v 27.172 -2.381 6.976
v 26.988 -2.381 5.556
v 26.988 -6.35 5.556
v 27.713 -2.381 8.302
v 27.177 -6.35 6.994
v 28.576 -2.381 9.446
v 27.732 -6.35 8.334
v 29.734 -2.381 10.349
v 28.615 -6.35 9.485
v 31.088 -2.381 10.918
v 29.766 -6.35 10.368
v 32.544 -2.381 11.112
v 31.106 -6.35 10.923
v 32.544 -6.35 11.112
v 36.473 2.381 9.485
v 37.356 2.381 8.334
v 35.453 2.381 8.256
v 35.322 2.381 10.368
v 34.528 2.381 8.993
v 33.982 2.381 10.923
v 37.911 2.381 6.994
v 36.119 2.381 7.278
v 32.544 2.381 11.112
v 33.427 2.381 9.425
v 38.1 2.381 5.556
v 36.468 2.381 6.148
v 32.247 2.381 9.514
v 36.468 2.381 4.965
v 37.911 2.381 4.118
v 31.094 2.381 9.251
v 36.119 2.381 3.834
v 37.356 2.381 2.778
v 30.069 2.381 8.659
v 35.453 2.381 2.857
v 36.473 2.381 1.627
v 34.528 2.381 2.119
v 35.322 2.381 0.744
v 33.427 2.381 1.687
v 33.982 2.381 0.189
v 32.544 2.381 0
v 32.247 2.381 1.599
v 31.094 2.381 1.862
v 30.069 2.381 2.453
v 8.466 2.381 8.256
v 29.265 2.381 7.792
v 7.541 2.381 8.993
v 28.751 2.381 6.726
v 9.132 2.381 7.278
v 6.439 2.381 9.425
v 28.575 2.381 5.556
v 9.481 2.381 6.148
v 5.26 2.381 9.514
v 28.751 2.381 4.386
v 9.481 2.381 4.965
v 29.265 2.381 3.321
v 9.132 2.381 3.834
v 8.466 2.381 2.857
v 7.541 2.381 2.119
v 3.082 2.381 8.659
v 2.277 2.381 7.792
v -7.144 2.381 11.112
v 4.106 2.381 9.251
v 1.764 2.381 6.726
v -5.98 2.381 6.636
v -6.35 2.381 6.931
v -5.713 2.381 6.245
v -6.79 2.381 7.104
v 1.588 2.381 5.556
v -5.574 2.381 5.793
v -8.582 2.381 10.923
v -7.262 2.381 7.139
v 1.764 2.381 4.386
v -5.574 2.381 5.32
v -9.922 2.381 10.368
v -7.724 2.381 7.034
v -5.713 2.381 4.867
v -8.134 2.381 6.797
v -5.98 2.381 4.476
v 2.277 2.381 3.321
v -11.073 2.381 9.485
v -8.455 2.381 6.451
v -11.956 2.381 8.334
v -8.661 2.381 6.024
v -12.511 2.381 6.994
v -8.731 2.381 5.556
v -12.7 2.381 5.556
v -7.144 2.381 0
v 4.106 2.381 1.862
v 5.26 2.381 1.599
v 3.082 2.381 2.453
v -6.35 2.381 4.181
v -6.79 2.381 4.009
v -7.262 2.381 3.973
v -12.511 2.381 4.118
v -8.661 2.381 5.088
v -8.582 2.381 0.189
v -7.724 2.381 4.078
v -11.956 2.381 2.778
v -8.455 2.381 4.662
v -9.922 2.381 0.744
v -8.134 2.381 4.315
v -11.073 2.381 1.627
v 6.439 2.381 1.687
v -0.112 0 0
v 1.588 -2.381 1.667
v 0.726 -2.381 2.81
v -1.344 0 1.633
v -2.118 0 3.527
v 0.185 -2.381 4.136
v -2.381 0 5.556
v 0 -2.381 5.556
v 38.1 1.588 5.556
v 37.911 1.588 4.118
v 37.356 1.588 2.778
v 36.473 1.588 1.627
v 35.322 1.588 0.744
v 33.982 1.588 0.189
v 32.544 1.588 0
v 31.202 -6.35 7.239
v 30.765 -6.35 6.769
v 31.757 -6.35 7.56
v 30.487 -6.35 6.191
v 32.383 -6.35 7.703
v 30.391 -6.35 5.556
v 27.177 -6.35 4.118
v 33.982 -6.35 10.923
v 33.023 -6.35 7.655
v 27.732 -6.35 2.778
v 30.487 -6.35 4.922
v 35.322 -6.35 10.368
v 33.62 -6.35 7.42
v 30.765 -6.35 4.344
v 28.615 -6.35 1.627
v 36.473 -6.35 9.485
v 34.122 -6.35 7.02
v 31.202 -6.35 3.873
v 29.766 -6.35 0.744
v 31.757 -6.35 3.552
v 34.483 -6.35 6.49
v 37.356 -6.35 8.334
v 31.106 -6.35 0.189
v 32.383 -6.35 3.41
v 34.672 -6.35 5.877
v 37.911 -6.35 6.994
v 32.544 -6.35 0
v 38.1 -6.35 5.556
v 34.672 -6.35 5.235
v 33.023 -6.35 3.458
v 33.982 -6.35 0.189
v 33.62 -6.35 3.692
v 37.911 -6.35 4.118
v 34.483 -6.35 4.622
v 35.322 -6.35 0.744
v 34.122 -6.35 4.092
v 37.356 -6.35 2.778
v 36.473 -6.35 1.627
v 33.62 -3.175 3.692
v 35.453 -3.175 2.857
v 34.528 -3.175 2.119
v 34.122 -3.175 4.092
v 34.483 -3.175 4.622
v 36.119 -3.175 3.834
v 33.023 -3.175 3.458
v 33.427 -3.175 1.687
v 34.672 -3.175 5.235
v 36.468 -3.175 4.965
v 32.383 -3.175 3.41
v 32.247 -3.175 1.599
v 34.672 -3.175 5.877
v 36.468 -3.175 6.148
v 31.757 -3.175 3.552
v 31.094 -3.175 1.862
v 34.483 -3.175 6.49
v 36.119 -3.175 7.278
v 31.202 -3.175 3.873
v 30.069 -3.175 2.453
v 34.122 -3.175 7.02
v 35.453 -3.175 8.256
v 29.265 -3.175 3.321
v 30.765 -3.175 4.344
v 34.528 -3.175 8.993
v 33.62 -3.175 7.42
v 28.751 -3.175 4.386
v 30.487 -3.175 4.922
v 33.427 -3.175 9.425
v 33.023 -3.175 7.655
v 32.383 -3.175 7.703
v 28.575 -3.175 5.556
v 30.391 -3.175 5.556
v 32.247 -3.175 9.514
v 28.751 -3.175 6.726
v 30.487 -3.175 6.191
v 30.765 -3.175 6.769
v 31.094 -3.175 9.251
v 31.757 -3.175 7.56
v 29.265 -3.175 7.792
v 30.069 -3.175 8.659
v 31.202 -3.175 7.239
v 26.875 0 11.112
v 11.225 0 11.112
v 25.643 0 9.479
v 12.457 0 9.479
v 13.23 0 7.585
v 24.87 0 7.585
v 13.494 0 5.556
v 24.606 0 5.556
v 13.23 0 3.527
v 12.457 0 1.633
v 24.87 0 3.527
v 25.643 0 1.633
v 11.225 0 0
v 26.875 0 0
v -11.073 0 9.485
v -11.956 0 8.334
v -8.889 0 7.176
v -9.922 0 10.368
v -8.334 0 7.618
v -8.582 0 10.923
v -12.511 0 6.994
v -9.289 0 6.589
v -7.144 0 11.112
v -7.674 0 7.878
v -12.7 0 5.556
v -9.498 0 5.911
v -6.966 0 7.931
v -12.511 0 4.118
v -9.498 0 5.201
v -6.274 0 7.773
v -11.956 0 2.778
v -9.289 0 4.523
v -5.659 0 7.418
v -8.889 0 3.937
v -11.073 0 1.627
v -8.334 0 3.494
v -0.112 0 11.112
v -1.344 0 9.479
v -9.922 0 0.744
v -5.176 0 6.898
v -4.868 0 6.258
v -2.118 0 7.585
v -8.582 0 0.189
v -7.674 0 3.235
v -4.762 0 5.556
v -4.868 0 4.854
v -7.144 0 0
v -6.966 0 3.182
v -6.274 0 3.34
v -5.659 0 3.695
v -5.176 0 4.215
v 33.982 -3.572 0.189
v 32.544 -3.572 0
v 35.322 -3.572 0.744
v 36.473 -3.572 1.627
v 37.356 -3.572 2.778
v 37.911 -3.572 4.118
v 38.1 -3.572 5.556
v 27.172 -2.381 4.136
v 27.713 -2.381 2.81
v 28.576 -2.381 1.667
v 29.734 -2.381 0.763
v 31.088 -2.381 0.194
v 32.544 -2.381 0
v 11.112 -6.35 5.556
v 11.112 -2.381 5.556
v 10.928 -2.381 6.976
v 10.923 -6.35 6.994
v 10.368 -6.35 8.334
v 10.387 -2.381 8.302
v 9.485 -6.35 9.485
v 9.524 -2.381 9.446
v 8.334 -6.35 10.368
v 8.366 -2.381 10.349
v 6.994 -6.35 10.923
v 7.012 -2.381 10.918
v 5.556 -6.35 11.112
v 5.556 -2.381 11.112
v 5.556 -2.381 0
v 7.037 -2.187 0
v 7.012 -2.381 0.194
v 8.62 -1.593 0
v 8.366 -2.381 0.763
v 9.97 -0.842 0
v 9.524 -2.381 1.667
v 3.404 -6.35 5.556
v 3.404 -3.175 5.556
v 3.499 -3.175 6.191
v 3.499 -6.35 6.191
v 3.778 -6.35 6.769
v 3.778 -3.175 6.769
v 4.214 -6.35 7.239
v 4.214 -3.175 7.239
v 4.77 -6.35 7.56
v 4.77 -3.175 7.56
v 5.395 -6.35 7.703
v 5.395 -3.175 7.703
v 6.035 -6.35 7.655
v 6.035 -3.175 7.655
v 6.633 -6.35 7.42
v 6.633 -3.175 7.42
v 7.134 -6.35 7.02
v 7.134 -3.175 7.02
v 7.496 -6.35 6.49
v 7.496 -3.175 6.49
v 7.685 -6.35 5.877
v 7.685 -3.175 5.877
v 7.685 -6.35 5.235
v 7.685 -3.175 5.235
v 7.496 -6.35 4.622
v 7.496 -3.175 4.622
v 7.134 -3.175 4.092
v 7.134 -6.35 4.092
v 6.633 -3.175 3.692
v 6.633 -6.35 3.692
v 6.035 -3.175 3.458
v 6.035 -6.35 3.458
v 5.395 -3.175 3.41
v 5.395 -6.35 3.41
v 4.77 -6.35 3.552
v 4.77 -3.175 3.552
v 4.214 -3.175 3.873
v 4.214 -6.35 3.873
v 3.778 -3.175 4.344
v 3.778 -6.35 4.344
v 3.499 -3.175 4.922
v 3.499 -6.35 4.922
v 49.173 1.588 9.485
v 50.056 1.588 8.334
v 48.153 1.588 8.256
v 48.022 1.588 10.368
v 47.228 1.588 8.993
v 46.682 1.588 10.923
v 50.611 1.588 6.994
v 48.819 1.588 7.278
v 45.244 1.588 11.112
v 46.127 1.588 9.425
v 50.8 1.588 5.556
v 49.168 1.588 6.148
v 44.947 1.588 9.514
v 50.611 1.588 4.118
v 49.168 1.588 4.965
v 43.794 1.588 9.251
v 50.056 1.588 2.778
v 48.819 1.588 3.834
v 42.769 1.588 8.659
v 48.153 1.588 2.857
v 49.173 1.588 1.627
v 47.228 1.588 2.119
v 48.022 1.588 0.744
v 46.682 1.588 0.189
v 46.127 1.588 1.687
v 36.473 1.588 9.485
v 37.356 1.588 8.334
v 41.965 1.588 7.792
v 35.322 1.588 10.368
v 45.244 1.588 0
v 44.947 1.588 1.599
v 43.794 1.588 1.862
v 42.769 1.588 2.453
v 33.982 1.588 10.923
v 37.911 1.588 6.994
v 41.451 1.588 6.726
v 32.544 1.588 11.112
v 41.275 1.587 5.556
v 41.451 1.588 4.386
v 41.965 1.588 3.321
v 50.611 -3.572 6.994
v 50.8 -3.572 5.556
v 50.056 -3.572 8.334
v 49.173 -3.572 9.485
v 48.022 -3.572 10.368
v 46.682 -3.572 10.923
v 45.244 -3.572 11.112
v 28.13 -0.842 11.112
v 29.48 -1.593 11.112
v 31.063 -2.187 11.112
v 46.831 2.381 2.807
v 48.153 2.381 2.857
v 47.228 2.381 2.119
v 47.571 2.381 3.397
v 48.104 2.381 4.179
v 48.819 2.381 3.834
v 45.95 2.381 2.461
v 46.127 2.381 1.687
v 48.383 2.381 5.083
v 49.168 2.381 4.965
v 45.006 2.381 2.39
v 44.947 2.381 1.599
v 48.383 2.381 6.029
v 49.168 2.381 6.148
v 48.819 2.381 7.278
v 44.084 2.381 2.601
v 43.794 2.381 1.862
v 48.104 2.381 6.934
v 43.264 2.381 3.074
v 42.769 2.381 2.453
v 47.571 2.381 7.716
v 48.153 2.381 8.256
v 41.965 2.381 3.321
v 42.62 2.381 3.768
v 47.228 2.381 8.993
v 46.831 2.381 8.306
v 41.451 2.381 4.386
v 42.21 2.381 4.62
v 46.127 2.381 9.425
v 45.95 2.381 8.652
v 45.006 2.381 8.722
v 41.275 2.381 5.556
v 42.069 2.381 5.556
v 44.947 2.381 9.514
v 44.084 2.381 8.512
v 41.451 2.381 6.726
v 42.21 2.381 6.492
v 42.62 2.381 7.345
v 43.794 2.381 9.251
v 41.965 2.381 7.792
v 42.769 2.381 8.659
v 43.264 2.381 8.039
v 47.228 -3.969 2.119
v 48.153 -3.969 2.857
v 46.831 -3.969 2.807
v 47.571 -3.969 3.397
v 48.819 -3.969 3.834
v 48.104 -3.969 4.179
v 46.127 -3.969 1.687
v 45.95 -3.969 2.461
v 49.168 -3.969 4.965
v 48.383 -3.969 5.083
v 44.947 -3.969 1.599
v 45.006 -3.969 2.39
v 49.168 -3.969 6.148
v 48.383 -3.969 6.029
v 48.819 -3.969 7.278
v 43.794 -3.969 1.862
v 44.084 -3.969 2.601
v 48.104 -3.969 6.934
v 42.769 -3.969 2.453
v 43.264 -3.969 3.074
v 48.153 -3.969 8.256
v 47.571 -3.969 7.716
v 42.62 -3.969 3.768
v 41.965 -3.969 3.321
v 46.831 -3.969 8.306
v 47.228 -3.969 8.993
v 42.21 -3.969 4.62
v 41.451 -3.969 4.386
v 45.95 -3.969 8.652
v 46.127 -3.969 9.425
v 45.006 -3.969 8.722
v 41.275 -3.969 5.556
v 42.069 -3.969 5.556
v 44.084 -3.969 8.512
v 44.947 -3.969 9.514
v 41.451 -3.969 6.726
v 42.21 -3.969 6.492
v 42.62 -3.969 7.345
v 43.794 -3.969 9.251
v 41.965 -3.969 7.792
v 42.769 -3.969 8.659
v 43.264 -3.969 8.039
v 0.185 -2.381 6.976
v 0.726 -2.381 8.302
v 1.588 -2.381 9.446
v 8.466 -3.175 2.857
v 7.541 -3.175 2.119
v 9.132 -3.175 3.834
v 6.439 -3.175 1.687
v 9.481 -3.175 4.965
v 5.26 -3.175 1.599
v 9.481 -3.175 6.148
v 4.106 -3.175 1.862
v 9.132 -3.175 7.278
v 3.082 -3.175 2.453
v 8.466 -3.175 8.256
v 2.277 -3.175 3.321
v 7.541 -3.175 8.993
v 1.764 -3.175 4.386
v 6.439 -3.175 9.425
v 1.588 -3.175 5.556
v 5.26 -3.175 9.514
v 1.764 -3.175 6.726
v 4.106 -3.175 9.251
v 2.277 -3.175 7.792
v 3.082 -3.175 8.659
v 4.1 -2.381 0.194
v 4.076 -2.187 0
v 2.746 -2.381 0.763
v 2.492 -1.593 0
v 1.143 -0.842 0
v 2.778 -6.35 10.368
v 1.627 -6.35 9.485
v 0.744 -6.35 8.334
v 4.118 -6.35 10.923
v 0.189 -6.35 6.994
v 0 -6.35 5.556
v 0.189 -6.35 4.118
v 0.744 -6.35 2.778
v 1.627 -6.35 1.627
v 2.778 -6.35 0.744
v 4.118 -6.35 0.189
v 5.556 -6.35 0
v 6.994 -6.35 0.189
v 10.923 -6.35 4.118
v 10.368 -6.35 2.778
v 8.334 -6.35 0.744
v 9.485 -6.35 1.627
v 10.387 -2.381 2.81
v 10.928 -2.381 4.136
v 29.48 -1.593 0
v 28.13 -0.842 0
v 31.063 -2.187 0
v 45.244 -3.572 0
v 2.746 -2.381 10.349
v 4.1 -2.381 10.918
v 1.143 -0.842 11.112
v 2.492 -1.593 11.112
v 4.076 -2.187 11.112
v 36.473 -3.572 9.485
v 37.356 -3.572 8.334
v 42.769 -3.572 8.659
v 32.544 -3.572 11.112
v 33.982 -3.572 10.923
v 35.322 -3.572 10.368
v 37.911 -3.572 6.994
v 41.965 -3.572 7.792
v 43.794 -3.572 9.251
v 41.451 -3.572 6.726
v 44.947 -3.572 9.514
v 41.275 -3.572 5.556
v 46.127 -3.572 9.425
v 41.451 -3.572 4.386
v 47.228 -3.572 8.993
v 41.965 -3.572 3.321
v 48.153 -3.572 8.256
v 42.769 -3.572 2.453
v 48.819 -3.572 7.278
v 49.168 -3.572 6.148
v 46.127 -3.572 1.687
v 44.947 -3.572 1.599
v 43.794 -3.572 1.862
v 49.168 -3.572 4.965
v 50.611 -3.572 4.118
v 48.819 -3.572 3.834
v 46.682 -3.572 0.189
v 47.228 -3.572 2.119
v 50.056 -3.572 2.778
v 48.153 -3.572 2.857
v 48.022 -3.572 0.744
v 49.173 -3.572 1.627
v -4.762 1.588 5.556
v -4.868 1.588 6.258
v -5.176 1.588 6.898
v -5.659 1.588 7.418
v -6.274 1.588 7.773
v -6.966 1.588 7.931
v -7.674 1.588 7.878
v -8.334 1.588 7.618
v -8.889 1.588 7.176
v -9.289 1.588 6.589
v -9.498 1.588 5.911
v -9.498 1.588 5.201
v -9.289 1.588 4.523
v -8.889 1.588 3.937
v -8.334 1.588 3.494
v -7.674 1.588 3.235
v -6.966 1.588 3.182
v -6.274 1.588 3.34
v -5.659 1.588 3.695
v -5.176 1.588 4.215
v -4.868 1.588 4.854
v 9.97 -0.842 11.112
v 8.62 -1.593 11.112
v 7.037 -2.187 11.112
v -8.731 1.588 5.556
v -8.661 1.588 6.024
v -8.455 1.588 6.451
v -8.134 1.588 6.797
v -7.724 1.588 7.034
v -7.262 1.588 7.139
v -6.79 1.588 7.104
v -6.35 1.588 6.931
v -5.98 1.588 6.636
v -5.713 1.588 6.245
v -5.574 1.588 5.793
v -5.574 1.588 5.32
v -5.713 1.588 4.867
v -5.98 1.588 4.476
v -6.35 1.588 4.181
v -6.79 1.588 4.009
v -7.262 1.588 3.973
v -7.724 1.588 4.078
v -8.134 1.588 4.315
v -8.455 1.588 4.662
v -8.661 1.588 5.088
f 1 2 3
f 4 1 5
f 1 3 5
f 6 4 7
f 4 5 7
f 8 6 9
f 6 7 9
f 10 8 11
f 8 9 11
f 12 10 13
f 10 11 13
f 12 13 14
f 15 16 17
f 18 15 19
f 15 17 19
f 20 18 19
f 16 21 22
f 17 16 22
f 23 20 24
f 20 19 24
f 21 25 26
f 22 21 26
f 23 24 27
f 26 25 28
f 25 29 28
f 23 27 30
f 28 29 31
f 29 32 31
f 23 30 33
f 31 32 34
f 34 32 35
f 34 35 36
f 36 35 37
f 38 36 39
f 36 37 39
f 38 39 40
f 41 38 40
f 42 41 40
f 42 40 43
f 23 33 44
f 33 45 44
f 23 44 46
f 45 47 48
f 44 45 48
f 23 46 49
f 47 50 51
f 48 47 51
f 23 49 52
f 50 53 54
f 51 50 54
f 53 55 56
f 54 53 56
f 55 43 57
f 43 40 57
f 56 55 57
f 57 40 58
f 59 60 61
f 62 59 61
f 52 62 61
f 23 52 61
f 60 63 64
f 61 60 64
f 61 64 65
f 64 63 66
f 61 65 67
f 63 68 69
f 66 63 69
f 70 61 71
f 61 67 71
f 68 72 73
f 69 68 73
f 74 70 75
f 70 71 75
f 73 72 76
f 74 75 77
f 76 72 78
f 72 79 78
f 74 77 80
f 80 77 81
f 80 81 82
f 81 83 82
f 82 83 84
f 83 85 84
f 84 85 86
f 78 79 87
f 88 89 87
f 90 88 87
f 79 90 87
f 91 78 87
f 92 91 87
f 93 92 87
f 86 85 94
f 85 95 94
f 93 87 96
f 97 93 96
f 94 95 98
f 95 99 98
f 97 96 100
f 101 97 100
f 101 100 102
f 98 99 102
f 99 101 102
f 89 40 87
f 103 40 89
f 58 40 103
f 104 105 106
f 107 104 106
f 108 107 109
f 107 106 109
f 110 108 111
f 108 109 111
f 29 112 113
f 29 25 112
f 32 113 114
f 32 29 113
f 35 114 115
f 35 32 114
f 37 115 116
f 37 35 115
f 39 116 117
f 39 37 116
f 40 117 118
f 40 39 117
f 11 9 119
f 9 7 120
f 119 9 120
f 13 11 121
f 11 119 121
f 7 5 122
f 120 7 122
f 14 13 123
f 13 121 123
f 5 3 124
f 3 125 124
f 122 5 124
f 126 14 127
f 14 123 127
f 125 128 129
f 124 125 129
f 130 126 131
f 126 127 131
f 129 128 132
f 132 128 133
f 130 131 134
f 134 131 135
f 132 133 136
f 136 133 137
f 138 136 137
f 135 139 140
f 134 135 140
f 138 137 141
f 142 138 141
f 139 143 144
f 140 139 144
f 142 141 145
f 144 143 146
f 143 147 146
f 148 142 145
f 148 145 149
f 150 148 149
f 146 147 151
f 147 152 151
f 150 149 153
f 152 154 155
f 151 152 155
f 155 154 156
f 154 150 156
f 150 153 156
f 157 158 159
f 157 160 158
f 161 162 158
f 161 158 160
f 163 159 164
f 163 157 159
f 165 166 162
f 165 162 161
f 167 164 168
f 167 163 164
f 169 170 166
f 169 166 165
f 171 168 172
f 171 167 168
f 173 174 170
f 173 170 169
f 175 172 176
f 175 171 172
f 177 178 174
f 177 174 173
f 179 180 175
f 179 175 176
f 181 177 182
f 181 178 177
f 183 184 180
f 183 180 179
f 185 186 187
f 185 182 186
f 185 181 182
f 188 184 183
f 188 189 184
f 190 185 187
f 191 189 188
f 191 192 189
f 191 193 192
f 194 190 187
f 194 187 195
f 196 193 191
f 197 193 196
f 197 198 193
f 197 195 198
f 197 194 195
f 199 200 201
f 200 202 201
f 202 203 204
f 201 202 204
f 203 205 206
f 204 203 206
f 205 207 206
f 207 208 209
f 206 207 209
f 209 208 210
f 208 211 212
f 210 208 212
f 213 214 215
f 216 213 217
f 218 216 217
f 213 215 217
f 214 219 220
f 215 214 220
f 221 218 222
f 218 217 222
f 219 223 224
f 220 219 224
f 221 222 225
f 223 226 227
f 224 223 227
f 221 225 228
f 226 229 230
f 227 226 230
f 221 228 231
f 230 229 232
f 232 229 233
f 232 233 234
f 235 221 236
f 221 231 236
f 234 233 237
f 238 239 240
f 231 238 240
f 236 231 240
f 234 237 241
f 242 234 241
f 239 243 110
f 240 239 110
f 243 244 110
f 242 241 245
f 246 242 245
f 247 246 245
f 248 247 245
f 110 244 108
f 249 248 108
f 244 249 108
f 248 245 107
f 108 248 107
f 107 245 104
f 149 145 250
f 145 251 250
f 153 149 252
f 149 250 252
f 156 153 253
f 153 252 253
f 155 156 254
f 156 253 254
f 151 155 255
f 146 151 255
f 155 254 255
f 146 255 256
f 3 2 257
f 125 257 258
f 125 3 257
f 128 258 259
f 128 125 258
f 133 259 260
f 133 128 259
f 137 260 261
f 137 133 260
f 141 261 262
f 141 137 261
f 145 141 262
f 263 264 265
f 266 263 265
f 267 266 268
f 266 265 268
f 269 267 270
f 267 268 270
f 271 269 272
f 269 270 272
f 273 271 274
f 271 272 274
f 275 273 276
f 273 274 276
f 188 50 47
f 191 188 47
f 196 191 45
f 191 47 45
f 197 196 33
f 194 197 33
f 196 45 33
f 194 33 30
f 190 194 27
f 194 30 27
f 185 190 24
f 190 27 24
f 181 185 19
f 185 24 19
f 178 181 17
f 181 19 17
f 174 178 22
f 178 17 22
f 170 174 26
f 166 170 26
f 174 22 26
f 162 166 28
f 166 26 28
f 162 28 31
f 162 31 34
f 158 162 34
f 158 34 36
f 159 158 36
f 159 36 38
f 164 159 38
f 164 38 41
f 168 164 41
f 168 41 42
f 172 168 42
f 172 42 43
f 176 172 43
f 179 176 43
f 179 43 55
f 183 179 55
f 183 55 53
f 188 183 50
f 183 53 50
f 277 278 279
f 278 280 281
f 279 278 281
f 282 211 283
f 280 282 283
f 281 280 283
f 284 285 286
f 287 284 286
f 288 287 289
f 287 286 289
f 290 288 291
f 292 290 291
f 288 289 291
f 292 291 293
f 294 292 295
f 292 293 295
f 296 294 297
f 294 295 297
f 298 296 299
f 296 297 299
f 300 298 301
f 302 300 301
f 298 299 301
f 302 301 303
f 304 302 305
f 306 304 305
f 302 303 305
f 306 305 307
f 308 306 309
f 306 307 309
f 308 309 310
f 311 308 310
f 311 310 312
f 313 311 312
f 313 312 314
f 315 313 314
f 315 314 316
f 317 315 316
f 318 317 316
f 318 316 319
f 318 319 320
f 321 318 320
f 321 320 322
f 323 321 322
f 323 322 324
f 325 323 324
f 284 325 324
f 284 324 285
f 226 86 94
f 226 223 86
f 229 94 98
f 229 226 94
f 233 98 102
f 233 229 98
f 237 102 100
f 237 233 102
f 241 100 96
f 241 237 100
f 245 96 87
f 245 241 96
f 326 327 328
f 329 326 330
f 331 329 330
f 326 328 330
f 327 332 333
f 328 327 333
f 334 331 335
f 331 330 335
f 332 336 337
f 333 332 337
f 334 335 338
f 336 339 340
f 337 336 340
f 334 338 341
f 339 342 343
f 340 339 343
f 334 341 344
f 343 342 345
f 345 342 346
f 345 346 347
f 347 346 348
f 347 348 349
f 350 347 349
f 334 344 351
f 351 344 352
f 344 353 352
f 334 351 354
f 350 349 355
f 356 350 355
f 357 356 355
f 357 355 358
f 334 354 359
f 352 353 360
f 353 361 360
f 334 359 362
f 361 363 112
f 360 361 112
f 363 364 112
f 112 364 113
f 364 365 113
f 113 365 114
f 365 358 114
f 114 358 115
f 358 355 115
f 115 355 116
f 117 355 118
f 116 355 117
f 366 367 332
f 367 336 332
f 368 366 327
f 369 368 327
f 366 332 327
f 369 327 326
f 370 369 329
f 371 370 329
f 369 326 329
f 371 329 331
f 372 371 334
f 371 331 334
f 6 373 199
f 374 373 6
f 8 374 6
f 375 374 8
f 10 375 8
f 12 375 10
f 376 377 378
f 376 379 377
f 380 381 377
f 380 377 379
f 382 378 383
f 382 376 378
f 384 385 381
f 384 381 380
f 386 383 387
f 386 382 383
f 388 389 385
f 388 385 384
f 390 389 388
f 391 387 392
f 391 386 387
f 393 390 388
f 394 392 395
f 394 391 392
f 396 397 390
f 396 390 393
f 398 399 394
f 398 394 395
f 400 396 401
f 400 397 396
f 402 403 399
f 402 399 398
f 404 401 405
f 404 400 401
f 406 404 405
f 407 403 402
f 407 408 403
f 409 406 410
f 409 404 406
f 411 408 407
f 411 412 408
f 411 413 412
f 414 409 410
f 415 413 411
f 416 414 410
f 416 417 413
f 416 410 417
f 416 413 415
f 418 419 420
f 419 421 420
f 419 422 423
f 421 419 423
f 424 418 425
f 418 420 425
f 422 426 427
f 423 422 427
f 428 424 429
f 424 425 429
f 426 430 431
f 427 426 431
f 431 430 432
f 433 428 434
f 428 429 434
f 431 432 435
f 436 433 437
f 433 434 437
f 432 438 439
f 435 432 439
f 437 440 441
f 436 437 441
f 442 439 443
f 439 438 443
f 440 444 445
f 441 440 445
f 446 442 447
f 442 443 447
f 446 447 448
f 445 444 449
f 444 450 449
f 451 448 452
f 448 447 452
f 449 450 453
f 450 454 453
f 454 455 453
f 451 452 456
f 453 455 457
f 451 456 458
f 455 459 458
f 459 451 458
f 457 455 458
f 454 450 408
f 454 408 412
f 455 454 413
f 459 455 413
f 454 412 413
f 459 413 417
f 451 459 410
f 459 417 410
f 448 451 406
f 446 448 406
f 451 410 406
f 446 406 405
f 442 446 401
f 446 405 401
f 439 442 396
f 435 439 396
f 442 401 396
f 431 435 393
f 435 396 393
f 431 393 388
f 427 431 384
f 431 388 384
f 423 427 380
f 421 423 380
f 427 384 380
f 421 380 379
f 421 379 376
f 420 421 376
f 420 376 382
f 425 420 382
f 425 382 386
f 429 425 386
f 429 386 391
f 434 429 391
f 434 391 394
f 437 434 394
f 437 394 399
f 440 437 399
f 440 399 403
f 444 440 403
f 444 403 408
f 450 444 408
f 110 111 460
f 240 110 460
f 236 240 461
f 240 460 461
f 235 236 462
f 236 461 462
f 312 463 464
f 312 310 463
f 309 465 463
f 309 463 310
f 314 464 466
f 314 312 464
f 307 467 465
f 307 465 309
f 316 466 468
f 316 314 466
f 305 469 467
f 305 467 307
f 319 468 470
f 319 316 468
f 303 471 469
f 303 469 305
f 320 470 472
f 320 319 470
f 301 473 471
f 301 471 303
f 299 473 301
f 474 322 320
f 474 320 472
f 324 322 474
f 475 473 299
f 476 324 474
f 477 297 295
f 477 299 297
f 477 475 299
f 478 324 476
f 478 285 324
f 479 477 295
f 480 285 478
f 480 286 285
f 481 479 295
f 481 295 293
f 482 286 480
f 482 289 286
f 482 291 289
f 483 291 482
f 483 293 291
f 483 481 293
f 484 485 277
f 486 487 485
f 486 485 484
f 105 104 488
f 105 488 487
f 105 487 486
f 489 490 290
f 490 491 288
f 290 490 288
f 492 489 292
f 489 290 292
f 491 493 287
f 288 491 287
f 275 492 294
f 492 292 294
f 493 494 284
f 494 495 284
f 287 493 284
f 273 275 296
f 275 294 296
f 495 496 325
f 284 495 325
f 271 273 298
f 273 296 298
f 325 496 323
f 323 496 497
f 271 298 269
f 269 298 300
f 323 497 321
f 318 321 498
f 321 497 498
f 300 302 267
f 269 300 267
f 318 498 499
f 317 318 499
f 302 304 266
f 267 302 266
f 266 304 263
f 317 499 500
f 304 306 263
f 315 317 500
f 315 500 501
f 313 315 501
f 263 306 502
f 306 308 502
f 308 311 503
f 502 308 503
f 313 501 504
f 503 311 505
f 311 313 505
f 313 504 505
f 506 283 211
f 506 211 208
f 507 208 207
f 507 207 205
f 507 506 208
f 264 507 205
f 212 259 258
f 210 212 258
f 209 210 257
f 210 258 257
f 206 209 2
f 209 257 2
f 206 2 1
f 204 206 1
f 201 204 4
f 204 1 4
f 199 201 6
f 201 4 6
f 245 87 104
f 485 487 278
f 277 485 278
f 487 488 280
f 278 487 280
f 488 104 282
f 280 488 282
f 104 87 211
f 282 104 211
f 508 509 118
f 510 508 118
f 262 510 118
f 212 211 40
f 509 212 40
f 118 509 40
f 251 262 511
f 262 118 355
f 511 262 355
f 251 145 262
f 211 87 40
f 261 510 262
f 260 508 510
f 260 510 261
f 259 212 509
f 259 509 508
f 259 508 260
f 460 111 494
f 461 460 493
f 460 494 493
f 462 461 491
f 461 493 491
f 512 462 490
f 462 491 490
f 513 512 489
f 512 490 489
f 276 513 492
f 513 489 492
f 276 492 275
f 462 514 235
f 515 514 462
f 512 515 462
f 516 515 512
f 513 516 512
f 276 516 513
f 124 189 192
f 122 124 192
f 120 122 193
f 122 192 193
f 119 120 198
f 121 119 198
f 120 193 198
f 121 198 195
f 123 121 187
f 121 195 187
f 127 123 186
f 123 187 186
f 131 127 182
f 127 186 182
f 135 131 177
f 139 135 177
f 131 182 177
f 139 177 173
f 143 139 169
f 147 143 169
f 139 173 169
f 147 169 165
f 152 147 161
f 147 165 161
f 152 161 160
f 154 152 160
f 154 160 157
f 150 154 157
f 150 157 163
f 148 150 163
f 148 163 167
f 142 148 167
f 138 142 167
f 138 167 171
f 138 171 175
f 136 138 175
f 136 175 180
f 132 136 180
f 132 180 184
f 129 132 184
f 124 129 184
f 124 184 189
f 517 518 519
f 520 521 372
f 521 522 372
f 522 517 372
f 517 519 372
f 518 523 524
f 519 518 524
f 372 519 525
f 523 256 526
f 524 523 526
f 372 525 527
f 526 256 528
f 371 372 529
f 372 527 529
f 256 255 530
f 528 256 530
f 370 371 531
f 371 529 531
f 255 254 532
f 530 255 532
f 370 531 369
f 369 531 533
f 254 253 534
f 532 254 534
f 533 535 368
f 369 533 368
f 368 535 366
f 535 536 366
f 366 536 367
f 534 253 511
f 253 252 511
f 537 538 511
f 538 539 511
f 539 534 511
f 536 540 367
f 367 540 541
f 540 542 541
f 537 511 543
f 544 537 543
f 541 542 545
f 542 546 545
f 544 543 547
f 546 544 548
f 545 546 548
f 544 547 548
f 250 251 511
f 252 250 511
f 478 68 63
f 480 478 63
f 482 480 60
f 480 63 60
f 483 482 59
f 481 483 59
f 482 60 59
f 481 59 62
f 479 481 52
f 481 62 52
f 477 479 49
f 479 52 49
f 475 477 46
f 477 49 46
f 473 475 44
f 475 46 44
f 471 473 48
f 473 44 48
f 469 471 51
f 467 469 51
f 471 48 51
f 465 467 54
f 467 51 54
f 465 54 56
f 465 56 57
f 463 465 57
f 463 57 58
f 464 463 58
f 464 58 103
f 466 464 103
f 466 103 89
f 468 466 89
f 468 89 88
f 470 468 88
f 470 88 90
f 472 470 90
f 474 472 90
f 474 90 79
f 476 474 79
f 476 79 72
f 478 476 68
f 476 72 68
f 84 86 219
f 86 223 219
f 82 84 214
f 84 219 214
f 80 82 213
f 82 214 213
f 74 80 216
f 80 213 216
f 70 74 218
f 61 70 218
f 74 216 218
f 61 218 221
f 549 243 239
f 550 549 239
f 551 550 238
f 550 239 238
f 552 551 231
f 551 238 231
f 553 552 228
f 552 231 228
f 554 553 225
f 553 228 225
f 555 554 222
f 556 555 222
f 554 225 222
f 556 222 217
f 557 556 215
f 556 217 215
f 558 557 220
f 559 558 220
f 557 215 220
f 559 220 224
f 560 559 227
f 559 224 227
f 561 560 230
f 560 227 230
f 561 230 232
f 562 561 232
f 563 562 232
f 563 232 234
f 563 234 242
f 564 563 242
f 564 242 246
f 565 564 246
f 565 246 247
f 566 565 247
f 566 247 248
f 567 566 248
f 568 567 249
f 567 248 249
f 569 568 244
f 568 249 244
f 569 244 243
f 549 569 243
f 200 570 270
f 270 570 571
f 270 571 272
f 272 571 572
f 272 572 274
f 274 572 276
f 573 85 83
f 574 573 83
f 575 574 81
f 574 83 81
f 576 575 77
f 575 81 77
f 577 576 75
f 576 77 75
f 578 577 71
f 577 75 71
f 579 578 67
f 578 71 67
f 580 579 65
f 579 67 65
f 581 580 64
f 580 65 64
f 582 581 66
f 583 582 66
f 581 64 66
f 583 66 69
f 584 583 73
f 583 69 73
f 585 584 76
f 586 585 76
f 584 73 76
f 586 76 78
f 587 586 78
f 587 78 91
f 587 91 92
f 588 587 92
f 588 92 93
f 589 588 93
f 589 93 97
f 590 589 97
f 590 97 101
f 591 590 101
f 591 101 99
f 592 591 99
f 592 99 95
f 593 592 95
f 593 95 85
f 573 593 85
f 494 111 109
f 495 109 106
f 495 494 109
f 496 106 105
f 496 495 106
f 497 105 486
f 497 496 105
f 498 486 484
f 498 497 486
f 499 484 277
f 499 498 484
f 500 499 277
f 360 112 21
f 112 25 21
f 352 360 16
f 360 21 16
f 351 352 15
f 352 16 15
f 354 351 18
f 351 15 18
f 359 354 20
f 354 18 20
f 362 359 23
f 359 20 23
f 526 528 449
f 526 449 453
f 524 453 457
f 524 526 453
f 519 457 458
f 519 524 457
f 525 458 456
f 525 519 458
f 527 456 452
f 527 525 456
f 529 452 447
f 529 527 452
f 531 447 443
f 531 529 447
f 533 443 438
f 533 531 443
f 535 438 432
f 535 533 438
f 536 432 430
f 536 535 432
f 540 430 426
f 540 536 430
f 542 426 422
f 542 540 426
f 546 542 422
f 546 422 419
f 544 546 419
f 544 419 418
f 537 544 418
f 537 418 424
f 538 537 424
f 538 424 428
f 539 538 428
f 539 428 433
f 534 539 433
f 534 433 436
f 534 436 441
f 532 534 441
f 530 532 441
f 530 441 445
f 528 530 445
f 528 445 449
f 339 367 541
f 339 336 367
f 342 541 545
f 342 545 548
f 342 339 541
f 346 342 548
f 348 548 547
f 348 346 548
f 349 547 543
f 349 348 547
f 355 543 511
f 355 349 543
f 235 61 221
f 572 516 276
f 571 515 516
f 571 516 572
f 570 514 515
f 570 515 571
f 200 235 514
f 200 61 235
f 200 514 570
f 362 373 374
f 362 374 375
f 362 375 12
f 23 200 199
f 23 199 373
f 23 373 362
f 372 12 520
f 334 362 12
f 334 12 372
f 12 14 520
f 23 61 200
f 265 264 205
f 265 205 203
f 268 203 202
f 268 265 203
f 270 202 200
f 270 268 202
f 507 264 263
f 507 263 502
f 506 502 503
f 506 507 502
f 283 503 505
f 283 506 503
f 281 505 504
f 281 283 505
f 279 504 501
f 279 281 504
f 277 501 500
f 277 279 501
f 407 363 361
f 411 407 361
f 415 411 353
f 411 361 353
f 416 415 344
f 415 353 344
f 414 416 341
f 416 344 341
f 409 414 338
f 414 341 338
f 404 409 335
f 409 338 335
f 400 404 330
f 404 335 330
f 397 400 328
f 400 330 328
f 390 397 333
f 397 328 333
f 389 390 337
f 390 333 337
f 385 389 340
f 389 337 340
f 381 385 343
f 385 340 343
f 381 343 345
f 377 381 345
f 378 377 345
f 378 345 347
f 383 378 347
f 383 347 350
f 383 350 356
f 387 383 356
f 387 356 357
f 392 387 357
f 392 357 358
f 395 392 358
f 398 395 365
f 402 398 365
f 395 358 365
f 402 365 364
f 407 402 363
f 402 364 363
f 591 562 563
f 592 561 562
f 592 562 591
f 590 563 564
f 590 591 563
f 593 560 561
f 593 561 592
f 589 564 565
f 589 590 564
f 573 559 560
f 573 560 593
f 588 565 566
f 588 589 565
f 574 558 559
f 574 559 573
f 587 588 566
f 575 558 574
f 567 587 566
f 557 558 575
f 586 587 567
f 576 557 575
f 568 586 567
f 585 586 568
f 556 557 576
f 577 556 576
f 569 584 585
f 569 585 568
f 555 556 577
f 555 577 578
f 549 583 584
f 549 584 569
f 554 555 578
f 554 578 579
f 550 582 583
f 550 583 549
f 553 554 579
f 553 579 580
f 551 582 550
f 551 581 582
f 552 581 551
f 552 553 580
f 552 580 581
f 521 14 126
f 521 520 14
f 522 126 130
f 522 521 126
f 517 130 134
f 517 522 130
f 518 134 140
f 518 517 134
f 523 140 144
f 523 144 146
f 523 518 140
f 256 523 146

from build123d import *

# Parameters (mm, degrees)
F1_DEPTH      = 11.1125
F2_R          = 3.175
F2_R_2        = 1.5875
F2_R_3        = 2.15265
F3_DEPTH      = 8.73125
F4_R          = 2.38125
F5_DEPTH      = 1.5875
F6_R          = 3.96875
F6_R_2        = 3.175
F7_DEPTH      = 0.79375
F7_DEPTH_BACK = 5.55625
F8_R          = 5.55624
F10_R         = 3.96875
F11_DEPTH     = 5.55625
F12_C1_SIZE   = 2.38125
F12_C2_SIZE   = 2.38125
F12_C3_SIZE   = 2.38125


# Not quite as in the source:
# - a fillet or chamfer is up to 0.001 mm smaller than in the source, because OpenCascade refuses the exact size


with BuildPart() as f1:
    # F0 (on Top) → F1 (new body)
    with BuildSketch(Plane.XY):
        Polygon((-12.7, 0), (0, 0), (0, -6.35), (11.1125, -6.35), (11.1125, 0), (26.9875, 0), (26.9875, -6.35), (38.1, -6.35), (38.1, -3.571875), (50.8, -3.571875), (50.8, 1.5875), (38.1, 1.5875), (38.1, 2.38125), (-12.7, 2.38125), align=None)
    extrude(amount=F1_DEPTH)

    # F2 (on face) → F3 (cut, through all)
    with BuildSketch(Plane(origin=(0, 2.38125, 0), x_dir=(-1, 0, 0), z_dir=(0, 1, 0))):
        with Locations((-45.24375, 5.55625)):
            Circle(F2_R)
        with Locations((7.14375, 5.55625)):
            Circle(F2_R_2)
        with Locations((-5.55625, 5.55625)):
            Circle(F2_R_3)
        with Locations((-32.54375, 5.55625)):
            Circle(F2_R_3)
    extrude(amount=-F3_DEPTH, mode=Mode.SUBTRACT)

    # F4 (on face) → F5 (cut)
    with BuildSketch(Plane.XZ):
        with Locations((-7.14375, 5.55625)):
            Circle(F4_R)
    extrude(amount=-F5_DEPTH, mode=Mode.SUBTRACT)

    # F6 (on face) → F7 (join, two sides)
    with BuildSketch(Plane(origin=(0, 1.5875, 0), x_dir=(-1, 0, 0), z_dir=(0, 1, 0))) as f7_sk:
        with Locations((-45.24375, 5.55625)):
            Circle(F6_R)
        with Locations((-45.24375, 5.55625)):
            Circle(F6_R_2, mode=Mode.SUBTRACT)
    extrude(amount=F7_DEPTH)
    extrude(f7_sk.sketch, amount=-F7_DEPTH_BACK)

    # F8 (radius 5.55625 in the source; OpenCascade refuses exactly that, so slightly less here)
    f8_edges = [f1.edges().sort_by_distance(p)[0] for p in [
        (0, -3.175, 0),
        (0, -3.175, 11.1125),
        (38.1, -4.960938, 0),
        (38.1, -4.960938, 11.1125),
        (38.1, 1.984375, 0),
        (38.1, 1.984375, 11.1125),
        (11.1125, -3.175, 11.1125),
        (11.1125, -3.175, 0),
        (26.9875, -3.175, 11.1125),
        (26.9875, -3.175, 0),
        (50.8, -0.992188, 11.1125),
        (50.8, -0.992188, 0),
        (-12.7, 1.190625, 11.1125),
        (-12.7, 1.190625, 0),
    ]]
    fillet(f8_edges, radius=F8_R)

    # F10 (on face) → F11 (cut, through all)
    with BuildSketch(Plane(origin=(0, 2.38125, 0), x_dir=(-1, 0, 0), z_dir=(0, 1, 0))):
        with Locations((-32.54375, 5.55625)):
            Circle(F10_R)
        with Locations((-5.55625, 5.55625)):
            Circle(F10_R)
    extrude(amount=-F11_DEPTH, mode=Mode.SUBTRACT)

    # F12: chamfer of 2.38125 on 5 edges, made by hand

    # F12_c1
    f12_c1_edges = [f1.edges().sort_by_distance(p)[0] for p in [
        (1.6273850181, 0, 9.4851149819),
        (0, 0, 5.55625),
        (1.6273850181, 0, 1.6273850181),
    ]]
    chamfer(f12_c1_edges, length=F12_C1_SIZE)

    # F12_c2
    f12_c2_edges = [f1.edges().sort_by_distance(p)[0] for p in [
        (28.6148850181, 0, 9.4851149819),
        (26.9875, 0, 5.55625),
        (28.6148850181, 0, 1.6273850181),
    ]]
    chamfer(f12_c2_edges, length=F12_C2_SIZE)

    # F12_c3
    f12_c3_edges = [f1.edges().sort_by_distance(p)[0] for p in [
        (11.1125, 0, 5.55625),
        (9.4851149819, 0, 9.4851149819),
        (9.4851149819, 0, 1.6273850181),
    ]]
    chamfer(f12_c3_edges, length=F12_C3_SIZE)


solid = f1.part
